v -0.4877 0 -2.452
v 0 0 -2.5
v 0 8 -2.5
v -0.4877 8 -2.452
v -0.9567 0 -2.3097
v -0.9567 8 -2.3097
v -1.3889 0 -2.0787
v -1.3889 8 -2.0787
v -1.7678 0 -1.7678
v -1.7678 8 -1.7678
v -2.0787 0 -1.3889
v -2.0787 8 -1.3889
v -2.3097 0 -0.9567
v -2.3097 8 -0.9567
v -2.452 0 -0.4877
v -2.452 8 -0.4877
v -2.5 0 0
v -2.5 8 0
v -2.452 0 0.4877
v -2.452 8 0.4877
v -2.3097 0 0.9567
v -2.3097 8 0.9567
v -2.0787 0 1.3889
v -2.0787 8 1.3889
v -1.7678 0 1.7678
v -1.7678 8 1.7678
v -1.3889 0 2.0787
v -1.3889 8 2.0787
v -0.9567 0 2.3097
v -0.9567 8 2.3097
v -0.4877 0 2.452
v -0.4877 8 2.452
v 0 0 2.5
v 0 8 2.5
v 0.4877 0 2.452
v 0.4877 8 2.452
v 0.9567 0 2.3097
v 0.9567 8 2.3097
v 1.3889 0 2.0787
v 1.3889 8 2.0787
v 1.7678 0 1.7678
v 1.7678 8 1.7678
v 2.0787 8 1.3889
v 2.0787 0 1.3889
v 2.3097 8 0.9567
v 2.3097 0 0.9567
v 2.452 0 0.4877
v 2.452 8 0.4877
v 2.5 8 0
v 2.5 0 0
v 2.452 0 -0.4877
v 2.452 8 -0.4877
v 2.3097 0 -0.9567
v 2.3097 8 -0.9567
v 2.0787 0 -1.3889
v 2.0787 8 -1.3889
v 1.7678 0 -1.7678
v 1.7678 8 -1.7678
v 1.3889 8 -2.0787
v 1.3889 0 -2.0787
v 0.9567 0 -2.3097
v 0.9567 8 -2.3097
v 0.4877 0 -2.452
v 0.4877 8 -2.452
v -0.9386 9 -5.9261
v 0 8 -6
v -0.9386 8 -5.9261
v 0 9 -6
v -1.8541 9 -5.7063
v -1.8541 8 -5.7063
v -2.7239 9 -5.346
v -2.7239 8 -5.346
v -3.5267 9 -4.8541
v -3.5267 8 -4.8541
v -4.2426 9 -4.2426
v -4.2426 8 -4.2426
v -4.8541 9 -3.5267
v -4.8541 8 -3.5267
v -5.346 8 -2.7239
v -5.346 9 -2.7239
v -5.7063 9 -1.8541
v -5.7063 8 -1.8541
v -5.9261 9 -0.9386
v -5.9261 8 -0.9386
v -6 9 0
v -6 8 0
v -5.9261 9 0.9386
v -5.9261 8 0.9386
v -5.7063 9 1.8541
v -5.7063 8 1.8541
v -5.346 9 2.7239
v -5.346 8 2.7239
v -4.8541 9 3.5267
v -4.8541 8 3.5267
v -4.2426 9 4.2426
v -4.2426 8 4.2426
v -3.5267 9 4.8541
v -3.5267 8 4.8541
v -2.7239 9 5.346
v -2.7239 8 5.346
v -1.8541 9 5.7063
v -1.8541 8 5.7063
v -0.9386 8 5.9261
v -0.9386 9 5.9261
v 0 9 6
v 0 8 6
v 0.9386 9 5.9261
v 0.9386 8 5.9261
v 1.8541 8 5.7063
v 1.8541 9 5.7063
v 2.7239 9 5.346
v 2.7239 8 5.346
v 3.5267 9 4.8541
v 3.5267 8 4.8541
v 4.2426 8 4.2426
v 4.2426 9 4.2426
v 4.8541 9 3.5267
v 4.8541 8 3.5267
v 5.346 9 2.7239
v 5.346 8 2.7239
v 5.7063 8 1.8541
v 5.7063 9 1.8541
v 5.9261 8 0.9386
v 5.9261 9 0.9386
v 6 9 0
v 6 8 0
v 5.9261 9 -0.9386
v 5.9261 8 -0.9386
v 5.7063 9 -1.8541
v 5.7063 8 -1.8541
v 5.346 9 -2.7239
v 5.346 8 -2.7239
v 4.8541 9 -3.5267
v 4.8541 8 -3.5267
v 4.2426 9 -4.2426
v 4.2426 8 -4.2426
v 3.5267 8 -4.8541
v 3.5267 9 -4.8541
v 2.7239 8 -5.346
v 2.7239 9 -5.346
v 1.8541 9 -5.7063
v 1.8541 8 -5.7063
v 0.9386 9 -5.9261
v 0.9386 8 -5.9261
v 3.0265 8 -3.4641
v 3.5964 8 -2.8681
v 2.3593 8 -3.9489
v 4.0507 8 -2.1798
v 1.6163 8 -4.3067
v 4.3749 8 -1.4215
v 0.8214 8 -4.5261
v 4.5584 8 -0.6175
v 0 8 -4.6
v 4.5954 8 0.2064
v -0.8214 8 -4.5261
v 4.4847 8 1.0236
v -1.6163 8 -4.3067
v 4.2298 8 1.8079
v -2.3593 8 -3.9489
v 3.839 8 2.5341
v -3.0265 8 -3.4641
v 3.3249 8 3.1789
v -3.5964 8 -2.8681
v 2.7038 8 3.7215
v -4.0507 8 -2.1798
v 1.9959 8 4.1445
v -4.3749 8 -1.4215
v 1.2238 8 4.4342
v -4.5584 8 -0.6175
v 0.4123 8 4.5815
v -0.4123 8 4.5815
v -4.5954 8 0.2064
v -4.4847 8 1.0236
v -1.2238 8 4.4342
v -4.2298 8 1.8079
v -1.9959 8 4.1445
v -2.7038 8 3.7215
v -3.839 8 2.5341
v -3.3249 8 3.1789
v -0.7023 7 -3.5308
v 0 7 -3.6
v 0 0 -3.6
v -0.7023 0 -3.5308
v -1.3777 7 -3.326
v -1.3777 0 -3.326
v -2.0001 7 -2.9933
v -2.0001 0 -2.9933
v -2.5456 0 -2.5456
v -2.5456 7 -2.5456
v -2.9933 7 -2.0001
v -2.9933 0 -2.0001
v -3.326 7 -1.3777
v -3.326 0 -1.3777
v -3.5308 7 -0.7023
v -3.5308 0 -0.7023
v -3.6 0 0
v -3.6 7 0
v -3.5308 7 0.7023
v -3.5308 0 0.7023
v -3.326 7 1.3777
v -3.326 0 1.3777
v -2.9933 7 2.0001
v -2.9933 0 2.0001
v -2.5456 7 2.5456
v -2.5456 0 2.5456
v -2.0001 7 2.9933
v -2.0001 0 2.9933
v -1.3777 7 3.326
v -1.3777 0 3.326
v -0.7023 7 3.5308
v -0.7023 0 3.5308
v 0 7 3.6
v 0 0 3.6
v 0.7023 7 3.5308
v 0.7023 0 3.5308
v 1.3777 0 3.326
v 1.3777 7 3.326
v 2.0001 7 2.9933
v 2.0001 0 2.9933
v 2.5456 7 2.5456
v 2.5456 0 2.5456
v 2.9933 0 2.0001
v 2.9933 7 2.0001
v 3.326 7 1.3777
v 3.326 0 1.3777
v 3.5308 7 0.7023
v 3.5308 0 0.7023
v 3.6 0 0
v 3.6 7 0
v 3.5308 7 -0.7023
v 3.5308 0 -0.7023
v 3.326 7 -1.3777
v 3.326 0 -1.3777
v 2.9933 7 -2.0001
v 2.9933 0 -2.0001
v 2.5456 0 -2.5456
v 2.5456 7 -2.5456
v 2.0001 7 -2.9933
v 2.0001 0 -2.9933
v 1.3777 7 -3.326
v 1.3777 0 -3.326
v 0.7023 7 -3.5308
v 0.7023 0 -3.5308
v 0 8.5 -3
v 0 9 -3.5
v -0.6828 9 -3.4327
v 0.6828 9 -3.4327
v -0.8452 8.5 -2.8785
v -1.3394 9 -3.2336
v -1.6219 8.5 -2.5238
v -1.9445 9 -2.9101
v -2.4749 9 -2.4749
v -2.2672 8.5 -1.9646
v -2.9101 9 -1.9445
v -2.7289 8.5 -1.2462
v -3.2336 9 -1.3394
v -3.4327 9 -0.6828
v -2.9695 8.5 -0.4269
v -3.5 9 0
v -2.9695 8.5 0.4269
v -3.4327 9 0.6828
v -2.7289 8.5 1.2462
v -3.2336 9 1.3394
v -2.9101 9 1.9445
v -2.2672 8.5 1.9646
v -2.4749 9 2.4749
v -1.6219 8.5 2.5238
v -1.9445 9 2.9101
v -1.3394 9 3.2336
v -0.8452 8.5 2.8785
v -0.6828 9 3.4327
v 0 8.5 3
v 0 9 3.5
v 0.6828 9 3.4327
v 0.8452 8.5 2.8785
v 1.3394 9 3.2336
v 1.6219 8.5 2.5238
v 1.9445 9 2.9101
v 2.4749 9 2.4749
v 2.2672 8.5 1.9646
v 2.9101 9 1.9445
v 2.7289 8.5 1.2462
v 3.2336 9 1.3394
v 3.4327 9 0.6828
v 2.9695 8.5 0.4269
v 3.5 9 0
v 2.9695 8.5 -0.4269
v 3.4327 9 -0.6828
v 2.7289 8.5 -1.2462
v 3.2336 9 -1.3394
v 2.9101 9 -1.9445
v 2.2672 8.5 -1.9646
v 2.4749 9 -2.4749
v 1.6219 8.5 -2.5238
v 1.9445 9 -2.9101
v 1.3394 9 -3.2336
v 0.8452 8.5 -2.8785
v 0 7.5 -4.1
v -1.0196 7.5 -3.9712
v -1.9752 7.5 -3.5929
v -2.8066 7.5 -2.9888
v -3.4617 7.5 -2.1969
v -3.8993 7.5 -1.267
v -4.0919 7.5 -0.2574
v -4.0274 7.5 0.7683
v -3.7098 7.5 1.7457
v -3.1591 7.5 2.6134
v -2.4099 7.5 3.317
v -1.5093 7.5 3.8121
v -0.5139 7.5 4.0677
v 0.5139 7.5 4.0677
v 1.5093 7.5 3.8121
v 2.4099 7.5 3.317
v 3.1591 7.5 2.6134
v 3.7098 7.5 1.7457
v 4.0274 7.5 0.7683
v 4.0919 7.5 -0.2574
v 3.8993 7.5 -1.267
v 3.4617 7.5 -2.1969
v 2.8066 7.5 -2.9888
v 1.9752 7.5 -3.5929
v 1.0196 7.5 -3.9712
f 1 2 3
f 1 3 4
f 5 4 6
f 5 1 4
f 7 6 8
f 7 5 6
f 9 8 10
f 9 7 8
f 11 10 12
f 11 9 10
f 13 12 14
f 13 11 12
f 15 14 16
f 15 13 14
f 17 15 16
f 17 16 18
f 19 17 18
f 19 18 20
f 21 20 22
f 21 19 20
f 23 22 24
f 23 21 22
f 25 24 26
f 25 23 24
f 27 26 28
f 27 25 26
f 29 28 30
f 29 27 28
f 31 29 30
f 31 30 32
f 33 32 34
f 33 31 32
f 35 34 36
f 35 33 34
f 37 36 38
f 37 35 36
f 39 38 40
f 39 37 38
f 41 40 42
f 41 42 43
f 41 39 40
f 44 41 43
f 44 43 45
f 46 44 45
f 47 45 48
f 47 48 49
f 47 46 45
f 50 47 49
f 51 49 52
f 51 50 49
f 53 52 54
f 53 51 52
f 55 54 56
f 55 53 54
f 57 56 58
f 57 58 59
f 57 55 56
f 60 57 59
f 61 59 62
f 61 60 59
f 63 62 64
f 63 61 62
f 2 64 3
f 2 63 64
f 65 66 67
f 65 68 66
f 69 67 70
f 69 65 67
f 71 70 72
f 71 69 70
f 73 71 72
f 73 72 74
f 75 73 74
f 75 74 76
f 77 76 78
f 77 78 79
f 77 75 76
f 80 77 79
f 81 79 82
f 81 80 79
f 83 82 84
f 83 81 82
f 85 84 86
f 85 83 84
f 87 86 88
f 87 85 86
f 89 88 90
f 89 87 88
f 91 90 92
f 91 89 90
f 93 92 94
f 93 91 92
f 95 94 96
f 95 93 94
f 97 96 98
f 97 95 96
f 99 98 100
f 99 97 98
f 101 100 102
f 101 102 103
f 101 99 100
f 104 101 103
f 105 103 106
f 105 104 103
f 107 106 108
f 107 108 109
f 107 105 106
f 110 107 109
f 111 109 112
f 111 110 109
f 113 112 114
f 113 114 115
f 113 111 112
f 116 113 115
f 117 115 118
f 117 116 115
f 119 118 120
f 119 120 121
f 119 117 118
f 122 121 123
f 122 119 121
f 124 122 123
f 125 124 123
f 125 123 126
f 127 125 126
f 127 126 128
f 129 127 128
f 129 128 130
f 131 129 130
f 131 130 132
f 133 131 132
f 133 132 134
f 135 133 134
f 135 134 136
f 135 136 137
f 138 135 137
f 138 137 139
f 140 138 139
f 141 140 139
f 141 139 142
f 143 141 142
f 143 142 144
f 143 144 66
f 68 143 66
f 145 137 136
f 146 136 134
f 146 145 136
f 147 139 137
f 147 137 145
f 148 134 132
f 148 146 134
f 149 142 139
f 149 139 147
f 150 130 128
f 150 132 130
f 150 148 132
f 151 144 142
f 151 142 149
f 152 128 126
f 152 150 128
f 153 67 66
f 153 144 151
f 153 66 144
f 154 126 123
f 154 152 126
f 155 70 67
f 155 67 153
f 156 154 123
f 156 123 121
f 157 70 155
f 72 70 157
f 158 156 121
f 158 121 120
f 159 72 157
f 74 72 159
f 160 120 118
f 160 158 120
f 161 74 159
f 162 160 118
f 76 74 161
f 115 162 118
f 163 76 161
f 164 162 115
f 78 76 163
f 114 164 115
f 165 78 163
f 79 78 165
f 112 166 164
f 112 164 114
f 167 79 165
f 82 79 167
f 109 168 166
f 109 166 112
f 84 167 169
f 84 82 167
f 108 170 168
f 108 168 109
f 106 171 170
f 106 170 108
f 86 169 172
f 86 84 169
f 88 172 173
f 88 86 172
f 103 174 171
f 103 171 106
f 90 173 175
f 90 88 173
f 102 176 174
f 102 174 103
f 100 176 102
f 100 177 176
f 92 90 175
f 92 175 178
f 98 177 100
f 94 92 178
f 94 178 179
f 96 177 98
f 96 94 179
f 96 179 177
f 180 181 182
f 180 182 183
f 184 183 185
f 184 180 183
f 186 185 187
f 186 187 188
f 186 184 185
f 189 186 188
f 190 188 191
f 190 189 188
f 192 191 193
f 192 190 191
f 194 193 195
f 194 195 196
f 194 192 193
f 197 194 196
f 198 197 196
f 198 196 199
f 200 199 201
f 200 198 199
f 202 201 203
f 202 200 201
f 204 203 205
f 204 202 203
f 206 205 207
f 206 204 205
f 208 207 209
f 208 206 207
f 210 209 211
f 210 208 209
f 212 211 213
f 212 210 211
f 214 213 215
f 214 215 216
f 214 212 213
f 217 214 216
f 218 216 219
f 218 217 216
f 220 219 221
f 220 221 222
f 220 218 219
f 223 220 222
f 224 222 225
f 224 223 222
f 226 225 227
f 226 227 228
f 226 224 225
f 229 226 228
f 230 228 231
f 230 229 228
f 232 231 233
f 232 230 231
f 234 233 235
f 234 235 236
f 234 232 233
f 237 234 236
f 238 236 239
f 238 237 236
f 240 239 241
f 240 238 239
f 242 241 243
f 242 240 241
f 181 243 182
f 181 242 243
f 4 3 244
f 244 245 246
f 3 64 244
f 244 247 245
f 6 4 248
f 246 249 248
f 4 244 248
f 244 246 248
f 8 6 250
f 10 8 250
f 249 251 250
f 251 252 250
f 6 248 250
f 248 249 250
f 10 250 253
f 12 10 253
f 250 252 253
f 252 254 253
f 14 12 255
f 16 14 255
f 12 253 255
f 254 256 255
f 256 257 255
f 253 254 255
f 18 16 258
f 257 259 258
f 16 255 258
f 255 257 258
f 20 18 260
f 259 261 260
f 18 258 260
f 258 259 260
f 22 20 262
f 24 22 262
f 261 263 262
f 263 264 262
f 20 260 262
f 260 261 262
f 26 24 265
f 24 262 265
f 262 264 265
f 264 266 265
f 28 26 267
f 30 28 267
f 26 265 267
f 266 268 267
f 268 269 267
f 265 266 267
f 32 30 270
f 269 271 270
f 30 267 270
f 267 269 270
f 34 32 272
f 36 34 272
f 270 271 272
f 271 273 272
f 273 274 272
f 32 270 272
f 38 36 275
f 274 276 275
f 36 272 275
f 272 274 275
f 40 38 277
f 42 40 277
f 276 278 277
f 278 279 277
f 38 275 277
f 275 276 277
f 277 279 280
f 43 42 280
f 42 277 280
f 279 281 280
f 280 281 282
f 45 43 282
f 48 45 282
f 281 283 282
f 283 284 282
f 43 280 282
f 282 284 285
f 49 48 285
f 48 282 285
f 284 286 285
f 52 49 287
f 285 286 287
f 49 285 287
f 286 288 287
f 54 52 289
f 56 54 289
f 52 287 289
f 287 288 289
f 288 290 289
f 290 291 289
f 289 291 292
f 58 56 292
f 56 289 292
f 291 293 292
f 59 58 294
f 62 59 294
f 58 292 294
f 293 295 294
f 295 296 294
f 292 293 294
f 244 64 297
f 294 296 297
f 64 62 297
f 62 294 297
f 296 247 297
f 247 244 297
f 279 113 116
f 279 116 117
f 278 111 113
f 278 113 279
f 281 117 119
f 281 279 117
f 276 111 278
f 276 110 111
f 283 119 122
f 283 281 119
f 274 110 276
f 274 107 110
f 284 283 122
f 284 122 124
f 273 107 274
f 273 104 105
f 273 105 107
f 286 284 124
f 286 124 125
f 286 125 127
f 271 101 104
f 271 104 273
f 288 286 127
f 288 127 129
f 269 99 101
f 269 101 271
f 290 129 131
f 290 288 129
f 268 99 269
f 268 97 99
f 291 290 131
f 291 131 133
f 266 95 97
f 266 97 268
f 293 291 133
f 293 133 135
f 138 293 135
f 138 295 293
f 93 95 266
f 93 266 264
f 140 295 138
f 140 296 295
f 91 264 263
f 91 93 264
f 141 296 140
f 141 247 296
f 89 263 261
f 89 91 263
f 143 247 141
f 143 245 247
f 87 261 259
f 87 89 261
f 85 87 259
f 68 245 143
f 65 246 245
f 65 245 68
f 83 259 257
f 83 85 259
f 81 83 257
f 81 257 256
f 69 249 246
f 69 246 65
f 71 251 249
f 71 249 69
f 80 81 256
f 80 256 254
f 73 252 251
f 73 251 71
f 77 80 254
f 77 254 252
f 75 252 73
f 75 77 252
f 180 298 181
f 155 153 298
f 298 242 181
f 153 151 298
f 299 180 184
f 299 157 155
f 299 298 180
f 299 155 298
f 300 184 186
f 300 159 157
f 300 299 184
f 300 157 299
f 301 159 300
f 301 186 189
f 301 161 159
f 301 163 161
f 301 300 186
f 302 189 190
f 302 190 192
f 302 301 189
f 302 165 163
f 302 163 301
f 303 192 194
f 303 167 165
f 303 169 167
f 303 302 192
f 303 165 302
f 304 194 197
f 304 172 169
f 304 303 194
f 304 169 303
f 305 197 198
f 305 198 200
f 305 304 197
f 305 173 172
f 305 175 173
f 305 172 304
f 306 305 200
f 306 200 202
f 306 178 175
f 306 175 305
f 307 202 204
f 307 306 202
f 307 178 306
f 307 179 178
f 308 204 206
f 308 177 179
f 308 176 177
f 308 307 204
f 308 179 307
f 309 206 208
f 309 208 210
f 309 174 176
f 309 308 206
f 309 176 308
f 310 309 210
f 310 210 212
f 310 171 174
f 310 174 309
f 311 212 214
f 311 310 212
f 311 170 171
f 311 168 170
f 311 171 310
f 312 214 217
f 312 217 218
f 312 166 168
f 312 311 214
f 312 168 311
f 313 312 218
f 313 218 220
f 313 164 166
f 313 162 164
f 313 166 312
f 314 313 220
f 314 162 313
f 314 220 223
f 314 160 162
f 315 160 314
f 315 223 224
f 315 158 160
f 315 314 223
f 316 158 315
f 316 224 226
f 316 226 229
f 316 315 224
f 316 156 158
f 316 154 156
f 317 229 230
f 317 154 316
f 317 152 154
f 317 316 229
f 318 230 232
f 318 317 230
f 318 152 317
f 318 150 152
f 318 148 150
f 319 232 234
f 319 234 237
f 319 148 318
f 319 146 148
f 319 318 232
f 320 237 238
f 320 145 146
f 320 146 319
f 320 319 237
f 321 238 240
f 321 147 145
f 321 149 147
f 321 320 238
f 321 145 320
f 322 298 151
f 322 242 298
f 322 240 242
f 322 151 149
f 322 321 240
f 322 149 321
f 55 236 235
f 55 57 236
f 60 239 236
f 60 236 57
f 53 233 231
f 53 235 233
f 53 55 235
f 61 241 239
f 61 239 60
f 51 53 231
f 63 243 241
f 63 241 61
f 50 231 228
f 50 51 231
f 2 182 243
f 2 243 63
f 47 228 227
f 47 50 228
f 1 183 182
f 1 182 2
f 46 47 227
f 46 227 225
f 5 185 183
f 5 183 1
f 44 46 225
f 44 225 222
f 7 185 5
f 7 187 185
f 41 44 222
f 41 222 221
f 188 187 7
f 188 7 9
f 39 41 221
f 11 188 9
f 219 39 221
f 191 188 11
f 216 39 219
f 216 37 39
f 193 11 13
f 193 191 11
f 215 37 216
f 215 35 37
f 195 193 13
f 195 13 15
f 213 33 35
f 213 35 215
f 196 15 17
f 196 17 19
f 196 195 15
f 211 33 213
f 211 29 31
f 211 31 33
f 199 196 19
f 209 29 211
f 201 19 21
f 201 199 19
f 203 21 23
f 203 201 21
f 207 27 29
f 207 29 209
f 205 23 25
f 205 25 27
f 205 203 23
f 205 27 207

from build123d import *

# Parameters (mm, degrees)
CHAMFER1_SIZE = 1
CHAMFER2_SIZE = 1


with BuildPart() as part:
    # Sketch1 → Revolve1 (revolve)
    with BuildSketch(Plane(origin=(0, 0, 0), x_dir=(0, 0, -1), z_dir=(1, 0, 0))):
        Polygon((2.5, 9), (2.5, 0), (3.6, 0), (3.6, 8), (6, 8), (6, 9), align=None)
    revolve(axis=Axis((0, 0, 0), (0, 1, 0)))

    # Chamfer1
    chamfer1_edges = [part.edges().sort_by_distance(p)[0] for p in [
        (0, 8, 3.6),
    ]]
    chamfer(chamfer1_edges, length=CHAMFER1_SIZE)

    # Chamfer2
    chamfer2_edges = [part.edges().sort_by_distance(p)[0] for p in [
        (0, 9, 2.5),
    ]]
    chamfer(chamfer2_edges, length=CHAMFER2_SIZE)


solid = part.part
